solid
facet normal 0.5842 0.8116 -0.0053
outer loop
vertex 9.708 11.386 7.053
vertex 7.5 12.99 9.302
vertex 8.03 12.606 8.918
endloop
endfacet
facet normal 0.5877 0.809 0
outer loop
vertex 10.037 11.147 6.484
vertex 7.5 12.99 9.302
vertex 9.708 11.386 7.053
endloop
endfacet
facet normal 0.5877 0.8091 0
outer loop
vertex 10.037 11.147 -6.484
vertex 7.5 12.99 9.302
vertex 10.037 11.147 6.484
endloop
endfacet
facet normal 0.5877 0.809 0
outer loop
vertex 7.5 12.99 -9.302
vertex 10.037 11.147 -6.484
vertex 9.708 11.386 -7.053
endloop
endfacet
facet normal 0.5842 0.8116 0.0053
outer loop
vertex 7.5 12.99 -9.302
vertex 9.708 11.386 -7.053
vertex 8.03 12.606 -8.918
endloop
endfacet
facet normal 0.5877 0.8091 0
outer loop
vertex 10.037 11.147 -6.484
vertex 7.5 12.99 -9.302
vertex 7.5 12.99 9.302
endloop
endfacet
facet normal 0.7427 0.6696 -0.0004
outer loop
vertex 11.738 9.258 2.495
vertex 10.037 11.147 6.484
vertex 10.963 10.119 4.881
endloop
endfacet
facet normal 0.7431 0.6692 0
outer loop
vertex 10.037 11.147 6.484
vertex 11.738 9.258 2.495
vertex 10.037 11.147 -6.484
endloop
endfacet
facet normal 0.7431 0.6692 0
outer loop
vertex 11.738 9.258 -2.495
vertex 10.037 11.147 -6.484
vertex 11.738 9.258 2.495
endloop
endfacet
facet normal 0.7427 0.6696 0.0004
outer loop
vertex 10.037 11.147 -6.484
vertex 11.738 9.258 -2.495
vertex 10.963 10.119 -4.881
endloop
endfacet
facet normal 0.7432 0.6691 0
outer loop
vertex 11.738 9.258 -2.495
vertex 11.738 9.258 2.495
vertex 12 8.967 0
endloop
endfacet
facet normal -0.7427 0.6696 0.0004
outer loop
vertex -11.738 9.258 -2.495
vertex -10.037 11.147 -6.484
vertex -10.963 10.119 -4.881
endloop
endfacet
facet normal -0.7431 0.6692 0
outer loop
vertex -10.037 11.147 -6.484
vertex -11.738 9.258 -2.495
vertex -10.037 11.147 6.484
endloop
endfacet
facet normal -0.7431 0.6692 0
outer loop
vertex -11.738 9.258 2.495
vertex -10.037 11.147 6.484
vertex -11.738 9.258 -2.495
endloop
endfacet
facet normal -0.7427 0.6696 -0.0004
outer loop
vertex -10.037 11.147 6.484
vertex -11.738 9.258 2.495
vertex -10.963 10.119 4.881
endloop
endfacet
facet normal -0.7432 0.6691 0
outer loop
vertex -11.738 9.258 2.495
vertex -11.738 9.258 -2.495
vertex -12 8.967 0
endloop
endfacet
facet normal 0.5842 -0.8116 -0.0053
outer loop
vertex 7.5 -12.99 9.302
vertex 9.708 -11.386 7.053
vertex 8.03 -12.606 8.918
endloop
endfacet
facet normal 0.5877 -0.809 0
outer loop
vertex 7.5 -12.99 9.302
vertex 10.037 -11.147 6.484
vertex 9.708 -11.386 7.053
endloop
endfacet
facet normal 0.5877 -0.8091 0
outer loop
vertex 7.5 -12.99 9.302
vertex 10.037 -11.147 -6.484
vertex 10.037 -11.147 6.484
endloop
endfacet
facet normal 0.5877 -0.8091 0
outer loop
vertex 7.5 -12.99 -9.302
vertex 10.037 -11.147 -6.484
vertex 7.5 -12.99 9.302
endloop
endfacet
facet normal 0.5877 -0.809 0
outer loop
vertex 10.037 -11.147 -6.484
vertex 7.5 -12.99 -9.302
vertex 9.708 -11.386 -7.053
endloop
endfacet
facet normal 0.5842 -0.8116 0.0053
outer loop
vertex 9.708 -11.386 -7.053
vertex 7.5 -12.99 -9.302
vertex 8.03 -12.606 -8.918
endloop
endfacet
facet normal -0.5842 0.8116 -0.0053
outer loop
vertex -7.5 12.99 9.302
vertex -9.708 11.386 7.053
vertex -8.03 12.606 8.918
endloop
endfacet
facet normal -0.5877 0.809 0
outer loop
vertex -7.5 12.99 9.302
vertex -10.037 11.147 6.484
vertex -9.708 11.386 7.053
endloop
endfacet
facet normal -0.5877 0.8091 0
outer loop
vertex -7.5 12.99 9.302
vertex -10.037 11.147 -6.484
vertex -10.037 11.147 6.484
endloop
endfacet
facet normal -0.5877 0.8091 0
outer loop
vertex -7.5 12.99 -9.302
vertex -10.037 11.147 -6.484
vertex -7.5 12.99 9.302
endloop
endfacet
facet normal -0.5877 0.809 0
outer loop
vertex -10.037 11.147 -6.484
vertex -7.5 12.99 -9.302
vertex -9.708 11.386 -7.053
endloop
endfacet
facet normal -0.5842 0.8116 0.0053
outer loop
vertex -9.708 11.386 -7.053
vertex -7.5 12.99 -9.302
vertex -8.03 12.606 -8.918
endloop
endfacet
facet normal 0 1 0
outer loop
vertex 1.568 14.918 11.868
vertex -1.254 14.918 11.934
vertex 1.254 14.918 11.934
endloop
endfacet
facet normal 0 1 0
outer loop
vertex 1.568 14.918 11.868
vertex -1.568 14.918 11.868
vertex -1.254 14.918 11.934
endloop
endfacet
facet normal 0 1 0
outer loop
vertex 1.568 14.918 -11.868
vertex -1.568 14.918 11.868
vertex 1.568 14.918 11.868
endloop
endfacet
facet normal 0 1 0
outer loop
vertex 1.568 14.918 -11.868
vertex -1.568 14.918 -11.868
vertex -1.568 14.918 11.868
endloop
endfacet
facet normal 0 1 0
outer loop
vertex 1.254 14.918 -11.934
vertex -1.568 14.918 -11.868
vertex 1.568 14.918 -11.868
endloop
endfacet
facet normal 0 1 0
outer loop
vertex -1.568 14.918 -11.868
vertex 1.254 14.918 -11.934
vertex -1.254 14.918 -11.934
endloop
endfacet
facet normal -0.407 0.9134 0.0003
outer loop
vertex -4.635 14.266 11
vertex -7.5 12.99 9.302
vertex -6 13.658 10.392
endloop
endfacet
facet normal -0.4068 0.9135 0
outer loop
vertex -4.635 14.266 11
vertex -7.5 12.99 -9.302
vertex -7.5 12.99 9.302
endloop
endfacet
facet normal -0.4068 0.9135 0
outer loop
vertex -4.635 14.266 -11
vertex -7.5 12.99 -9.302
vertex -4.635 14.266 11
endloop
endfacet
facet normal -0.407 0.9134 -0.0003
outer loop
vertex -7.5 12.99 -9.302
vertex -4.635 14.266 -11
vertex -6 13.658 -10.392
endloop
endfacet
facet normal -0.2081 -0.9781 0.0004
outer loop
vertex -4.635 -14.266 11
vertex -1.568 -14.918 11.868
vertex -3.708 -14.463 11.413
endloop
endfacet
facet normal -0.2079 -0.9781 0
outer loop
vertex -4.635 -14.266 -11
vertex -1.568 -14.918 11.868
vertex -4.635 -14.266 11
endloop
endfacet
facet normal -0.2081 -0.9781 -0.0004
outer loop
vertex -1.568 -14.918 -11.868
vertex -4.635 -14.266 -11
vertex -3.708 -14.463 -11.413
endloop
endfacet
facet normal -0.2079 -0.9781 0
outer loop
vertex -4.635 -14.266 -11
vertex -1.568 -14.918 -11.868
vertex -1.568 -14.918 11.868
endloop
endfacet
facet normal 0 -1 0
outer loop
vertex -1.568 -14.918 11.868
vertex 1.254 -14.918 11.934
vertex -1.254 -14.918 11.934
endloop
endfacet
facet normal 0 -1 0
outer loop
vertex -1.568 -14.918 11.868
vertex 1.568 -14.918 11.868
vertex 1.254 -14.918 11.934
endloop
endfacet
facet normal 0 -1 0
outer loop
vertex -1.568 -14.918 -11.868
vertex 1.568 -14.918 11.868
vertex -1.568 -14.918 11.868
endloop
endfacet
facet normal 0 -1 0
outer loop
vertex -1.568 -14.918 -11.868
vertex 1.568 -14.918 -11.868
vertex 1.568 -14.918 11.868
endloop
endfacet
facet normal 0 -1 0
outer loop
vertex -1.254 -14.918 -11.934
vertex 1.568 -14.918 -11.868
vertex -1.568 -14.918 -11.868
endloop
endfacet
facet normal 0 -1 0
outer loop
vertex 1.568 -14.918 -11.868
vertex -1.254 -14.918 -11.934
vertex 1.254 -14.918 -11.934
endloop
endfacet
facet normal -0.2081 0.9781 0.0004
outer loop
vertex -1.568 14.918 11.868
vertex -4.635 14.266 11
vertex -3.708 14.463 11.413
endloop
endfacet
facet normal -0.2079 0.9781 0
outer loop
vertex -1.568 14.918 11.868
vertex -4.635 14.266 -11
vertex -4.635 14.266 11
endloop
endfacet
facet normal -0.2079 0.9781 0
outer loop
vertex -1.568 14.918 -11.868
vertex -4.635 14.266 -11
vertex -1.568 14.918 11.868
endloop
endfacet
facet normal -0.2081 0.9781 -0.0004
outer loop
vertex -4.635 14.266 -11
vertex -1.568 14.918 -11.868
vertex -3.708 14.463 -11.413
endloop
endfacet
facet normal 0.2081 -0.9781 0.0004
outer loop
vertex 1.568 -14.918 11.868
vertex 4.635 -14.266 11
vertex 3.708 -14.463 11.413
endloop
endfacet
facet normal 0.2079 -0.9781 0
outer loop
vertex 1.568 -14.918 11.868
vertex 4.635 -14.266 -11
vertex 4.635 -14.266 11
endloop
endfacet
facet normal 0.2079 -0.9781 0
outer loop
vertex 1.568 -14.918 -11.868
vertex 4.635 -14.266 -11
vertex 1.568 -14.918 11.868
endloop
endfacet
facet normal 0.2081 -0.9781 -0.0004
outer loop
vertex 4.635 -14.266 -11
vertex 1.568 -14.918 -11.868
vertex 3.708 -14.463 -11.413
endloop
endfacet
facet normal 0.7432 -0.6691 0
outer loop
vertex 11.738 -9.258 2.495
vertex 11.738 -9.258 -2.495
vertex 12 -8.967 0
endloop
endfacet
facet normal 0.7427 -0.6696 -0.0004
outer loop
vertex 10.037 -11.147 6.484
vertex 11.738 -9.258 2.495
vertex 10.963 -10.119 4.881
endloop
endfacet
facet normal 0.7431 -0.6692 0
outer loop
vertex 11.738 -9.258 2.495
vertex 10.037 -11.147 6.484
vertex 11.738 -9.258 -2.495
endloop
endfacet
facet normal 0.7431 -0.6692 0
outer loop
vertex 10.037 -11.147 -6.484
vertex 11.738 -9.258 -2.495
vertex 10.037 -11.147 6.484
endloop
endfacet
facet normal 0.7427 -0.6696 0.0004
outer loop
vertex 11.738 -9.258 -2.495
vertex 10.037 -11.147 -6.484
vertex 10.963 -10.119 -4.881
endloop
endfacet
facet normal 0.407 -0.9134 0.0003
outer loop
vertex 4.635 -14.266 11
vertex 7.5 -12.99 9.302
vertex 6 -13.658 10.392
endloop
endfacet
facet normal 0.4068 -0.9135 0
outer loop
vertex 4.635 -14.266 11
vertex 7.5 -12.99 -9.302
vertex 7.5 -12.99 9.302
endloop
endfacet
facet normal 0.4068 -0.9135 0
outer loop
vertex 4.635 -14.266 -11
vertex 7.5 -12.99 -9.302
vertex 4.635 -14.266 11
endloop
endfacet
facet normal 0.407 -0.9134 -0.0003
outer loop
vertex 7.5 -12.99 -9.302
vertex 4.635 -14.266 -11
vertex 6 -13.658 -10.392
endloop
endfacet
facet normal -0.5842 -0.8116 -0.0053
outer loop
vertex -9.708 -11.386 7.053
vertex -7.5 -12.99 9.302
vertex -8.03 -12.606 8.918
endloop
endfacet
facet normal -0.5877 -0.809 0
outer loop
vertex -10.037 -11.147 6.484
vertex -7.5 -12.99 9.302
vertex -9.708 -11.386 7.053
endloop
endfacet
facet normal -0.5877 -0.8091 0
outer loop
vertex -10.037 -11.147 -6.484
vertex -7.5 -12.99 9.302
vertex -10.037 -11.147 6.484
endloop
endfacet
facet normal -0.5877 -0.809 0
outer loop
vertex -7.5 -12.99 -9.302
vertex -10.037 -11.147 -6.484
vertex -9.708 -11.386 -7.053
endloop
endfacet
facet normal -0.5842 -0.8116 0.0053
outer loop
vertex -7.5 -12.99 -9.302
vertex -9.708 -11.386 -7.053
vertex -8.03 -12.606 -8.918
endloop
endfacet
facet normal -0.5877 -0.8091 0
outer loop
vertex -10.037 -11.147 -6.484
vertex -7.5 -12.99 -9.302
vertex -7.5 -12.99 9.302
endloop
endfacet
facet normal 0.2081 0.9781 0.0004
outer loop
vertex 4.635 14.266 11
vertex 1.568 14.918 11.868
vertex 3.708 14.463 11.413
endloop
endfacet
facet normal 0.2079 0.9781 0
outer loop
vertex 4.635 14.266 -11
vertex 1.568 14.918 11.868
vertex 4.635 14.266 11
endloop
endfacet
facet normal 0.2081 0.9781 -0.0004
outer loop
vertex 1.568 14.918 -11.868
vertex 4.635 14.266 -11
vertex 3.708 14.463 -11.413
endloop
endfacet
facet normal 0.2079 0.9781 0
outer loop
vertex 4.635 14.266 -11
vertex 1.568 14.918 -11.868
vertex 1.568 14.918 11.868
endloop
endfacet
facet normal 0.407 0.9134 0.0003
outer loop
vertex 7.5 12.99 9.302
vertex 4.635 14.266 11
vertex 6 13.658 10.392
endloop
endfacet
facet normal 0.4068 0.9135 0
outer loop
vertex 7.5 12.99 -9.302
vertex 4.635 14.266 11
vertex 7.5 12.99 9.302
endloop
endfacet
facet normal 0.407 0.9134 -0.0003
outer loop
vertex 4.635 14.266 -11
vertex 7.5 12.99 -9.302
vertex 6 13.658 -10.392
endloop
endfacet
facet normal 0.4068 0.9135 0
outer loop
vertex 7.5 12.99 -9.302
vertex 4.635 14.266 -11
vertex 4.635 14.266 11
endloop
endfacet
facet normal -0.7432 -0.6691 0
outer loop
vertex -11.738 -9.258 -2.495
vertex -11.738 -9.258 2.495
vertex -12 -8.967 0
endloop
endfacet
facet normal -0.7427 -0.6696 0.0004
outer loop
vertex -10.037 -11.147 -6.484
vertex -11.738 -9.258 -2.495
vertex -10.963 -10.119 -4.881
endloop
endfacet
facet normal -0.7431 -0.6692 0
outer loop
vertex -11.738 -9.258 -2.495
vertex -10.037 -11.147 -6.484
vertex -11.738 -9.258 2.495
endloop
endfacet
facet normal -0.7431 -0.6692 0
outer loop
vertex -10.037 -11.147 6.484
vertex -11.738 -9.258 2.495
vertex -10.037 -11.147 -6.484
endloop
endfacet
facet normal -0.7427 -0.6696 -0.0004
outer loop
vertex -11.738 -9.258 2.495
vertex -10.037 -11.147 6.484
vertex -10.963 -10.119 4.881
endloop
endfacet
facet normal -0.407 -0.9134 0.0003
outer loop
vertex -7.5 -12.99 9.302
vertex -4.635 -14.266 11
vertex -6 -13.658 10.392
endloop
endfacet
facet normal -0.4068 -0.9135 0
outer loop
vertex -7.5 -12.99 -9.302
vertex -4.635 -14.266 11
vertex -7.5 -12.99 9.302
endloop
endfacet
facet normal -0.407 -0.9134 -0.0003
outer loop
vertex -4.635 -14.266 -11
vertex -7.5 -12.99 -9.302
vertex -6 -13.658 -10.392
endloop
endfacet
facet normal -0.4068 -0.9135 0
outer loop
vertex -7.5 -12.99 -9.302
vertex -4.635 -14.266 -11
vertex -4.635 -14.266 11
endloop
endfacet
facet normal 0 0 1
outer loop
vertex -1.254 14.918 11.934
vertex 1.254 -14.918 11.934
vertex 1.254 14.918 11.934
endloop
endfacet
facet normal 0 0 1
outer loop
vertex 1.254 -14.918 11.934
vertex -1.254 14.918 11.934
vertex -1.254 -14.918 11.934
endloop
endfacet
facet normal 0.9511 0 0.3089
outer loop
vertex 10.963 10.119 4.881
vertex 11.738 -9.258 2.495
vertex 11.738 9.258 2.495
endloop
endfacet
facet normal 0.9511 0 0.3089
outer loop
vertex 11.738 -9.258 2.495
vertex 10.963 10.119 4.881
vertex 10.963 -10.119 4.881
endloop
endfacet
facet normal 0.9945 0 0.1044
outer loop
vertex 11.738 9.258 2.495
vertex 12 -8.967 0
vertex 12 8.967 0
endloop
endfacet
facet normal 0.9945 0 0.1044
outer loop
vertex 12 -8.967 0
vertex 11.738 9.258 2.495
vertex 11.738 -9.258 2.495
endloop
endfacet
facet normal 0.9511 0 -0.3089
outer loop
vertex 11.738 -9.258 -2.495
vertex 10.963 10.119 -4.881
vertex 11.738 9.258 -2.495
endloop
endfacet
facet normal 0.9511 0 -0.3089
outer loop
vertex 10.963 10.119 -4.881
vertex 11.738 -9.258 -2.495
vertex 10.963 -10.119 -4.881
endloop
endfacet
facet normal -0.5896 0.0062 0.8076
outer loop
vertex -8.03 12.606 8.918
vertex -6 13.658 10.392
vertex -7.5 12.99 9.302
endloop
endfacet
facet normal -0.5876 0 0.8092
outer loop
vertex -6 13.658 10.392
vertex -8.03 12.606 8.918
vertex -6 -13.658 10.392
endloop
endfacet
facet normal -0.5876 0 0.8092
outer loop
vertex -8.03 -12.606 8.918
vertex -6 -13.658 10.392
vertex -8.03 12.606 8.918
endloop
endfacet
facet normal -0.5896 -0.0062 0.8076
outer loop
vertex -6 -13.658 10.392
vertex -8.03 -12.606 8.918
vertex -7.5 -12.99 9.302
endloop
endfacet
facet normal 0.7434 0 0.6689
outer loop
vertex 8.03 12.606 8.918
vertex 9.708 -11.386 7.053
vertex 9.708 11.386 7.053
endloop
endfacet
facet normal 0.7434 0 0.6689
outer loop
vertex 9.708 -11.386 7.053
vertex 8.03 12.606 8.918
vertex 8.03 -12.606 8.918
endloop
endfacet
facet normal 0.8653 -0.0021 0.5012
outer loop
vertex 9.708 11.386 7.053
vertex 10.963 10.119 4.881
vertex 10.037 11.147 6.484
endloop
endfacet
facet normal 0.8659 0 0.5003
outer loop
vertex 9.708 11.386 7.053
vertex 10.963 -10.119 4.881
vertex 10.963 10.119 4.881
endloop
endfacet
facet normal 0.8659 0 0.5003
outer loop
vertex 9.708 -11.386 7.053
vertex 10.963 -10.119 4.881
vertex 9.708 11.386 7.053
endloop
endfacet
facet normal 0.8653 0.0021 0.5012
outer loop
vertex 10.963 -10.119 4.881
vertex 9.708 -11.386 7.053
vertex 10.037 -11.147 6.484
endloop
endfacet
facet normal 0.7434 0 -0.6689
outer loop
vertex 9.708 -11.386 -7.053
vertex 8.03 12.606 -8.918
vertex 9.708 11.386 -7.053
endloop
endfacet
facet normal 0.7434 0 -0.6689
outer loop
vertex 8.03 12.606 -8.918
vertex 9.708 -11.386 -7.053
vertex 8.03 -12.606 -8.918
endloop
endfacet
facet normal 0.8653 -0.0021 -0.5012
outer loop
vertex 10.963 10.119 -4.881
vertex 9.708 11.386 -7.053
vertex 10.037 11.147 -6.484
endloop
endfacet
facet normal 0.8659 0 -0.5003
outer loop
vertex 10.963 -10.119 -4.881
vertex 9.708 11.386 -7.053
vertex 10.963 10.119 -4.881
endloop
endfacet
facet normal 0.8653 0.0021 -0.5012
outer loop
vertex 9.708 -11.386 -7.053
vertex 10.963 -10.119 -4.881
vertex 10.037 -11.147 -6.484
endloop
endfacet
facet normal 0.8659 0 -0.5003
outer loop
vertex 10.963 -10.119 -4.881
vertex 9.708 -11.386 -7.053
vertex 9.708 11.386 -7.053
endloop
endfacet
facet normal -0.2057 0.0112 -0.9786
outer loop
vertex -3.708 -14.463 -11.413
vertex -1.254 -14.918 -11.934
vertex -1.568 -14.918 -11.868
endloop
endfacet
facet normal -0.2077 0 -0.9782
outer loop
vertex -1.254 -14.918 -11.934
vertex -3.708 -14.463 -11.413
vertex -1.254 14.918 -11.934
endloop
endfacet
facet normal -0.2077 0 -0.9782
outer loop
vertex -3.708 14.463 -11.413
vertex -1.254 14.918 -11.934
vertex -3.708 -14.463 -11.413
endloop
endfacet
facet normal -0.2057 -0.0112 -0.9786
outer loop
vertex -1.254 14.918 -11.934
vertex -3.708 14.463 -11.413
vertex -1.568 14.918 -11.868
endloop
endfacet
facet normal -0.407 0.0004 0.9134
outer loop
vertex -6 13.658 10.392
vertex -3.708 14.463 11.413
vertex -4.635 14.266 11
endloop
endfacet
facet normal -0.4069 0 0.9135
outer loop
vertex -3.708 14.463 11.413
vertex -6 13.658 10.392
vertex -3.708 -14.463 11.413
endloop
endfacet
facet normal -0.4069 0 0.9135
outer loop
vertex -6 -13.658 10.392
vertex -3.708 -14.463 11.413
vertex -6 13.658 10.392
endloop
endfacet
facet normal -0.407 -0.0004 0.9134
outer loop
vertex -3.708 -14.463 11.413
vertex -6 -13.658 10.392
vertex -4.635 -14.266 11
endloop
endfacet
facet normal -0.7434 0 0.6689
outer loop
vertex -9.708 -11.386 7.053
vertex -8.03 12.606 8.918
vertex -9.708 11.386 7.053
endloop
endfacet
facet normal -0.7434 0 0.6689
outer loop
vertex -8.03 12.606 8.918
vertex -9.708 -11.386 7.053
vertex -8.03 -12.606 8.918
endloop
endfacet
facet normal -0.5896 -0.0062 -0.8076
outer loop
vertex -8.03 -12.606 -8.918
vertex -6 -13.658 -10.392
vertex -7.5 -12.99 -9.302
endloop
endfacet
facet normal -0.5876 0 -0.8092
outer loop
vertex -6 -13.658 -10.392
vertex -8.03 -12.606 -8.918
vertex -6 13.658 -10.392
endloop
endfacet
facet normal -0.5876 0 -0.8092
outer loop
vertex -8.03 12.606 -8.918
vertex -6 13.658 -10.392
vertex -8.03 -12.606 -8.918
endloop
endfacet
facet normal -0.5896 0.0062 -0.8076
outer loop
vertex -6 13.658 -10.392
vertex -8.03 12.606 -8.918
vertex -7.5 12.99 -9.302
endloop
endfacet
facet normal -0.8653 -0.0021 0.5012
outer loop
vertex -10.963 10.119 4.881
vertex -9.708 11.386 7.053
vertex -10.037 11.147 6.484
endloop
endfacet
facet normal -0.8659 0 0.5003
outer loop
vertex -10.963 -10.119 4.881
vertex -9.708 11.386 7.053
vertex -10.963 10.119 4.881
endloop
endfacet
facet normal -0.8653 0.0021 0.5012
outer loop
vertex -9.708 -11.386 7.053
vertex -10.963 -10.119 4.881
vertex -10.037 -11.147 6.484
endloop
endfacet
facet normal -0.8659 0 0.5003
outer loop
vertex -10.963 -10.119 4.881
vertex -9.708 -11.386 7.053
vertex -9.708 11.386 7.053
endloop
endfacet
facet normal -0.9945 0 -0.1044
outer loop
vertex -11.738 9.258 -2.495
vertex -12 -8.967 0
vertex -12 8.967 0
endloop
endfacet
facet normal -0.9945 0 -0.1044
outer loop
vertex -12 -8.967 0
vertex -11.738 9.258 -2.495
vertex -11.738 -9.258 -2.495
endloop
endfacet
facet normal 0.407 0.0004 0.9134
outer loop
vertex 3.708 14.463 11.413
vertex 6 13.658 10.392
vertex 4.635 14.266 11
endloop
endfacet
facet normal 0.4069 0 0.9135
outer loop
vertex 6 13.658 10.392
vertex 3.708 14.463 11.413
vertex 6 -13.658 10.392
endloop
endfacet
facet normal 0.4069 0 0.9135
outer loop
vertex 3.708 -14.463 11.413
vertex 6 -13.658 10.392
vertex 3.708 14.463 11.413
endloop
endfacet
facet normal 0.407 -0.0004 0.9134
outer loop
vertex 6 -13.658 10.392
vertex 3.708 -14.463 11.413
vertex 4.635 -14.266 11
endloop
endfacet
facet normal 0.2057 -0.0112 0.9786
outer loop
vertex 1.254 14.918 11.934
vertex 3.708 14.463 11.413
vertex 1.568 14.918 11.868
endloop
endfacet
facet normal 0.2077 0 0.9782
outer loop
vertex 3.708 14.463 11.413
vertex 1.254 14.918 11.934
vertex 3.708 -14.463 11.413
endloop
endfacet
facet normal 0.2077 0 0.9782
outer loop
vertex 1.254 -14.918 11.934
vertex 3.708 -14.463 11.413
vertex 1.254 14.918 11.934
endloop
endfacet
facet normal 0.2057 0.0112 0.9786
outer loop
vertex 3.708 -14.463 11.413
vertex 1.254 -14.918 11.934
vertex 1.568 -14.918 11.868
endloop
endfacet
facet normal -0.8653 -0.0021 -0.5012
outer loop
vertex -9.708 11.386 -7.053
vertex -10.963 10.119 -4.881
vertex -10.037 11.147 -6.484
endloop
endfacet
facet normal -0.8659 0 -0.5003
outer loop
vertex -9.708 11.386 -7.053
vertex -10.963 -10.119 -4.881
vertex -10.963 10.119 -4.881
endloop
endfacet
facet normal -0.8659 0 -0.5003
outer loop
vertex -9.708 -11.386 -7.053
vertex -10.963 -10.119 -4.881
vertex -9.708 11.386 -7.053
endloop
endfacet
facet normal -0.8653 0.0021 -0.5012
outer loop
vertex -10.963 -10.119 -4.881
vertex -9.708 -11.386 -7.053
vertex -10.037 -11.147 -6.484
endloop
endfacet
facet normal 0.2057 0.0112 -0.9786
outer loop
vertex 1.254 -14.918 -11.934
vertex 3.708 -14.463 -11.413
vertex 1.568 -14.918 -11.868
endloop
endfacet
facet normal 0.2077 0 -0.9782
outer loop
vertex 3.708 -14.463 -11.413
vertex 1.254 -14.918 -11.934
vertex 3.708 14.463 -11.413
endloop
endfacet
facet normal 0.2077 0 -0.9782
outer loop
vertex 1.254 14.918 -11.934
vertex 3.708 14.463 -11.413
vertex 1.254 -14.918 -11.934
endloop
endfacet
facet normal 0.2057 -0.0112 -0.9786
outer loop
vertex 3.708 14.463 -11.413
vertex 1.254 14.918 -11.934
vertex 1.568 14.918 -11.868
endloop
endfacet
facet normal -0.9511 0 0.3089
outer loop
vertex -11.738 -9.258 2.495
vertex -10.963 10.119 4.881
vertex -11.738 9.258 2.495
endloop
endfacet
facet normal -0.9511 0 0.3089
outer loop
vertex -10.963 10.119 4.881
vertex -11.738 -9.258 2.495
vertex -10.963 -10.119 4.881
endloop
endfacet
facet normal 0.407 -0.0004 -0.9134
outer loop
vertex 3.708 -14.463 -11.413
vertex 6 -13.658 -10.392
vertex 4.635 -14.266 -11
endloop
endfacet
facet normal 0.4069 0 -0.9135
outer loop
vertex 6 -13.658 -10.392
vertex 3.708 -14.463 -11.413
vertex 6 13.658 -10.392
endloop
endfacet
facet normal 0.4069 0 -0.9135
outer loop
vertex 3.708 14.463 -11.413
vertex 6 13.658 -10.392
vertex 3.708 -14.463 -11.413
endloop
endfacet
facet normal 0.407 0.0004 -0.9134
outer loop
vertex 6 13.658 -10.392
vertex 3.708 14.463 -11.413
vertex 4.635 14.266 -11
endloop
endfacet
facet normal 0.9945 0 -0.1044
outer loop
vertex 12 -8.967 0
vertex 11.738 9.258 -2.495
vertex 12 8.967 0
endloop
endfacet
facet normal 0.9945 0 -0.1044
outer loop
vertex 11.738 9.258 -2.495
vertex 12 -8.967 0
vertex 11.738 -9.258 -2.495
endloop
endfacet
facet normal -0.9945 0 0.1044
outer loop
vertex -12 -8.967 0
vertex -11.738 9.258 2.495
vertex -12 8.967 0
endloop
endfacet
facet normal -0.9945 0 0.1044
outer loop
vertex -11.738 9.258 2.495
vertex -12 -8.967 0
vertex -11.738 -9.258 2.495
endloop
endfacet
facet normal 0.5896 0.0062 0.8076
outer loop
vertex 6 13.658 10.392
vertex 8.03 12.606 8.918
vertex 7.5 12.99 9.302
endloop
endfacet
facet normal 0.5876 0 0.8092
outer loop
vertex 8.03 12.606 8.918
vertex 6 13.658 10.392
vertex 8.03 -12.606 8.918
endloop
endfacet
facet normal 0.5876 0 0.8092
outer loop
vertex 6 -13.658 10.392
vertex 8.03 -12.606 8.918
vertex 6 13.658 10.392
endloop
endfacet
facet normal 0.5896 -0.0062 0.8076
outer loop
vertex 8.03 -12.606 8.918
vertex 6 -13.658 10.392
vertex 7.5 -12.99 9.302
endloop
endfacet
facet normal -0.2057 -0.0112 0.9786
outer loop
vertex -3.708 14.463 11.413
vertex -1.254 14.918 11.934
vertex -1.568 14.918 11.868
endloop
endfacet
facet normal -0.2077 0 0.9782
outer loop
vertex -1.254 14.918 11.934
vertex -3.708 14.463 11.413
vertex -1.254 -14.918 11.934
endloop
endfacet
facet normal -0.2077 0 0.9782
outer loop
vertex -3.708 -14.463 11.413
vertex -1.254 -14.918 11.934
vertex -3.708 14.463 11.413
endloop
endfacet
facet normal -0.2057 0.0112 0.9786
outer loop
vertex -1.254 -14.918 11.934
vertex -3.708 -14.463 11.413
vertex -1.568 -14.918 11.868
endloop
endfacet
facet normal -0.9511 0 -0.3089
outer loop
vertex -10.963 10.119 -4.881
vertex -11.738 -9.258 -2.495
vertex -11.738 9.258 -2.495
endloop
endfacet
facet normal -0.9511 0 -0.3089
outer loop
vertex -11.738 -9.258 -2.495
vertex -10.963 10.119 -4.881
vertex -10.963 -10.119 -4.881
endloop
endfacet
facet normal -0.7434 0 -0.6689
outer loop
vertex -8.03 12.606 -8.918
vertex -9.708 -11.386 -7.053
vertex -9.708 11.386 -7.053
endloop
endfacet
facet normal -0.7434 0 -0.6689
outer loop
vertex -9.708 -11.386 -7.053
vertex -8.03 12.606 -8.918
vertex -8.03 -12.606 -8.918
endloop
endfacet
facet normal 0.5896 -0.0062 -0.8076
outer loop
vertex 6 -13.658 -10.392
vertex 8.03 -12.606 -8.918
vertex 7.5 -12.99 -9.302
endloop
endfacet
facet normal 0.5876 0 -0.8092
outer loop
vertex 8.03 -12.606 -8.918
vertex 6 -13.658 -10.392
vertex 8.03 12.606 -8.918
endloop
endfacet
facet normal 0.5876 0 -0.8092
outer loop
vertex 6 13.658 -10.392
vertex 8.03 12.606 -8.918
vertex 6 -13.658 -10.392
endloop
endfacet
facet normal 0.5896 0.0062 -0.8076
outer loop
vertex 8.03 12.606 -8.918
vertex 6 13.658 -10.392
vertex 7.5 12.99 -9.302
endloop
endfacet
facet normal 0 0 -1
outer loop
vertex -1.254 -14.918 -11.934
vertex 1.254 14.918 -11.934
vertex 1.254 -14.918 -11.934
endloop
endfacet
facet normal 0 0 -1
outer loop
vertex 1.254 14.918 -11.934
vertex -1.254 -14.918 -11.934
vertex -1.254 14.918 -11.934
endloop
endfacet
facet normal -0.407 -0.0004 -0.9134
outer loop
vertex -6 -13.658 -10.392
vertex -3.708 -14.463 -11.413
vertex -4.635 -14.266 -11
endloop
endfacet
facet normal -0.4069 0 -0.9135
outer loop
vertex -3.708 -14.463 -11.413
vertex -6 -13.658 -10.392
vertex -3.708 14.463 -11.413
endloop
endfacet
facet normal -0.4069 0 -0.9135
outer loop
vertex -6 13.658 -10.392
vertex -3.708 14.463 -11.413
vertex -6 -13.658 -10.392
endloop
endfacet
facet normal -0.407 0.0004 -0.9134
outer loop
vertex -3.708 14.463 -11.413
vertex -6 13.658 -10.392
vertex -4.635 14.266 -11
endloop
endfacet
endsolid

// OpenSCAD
intersection() {
  cylinder(h = 40, r = 15, center = true);
  rotate([90, 0, 0])
    cylinder(40, r = 12, center = true);
}
